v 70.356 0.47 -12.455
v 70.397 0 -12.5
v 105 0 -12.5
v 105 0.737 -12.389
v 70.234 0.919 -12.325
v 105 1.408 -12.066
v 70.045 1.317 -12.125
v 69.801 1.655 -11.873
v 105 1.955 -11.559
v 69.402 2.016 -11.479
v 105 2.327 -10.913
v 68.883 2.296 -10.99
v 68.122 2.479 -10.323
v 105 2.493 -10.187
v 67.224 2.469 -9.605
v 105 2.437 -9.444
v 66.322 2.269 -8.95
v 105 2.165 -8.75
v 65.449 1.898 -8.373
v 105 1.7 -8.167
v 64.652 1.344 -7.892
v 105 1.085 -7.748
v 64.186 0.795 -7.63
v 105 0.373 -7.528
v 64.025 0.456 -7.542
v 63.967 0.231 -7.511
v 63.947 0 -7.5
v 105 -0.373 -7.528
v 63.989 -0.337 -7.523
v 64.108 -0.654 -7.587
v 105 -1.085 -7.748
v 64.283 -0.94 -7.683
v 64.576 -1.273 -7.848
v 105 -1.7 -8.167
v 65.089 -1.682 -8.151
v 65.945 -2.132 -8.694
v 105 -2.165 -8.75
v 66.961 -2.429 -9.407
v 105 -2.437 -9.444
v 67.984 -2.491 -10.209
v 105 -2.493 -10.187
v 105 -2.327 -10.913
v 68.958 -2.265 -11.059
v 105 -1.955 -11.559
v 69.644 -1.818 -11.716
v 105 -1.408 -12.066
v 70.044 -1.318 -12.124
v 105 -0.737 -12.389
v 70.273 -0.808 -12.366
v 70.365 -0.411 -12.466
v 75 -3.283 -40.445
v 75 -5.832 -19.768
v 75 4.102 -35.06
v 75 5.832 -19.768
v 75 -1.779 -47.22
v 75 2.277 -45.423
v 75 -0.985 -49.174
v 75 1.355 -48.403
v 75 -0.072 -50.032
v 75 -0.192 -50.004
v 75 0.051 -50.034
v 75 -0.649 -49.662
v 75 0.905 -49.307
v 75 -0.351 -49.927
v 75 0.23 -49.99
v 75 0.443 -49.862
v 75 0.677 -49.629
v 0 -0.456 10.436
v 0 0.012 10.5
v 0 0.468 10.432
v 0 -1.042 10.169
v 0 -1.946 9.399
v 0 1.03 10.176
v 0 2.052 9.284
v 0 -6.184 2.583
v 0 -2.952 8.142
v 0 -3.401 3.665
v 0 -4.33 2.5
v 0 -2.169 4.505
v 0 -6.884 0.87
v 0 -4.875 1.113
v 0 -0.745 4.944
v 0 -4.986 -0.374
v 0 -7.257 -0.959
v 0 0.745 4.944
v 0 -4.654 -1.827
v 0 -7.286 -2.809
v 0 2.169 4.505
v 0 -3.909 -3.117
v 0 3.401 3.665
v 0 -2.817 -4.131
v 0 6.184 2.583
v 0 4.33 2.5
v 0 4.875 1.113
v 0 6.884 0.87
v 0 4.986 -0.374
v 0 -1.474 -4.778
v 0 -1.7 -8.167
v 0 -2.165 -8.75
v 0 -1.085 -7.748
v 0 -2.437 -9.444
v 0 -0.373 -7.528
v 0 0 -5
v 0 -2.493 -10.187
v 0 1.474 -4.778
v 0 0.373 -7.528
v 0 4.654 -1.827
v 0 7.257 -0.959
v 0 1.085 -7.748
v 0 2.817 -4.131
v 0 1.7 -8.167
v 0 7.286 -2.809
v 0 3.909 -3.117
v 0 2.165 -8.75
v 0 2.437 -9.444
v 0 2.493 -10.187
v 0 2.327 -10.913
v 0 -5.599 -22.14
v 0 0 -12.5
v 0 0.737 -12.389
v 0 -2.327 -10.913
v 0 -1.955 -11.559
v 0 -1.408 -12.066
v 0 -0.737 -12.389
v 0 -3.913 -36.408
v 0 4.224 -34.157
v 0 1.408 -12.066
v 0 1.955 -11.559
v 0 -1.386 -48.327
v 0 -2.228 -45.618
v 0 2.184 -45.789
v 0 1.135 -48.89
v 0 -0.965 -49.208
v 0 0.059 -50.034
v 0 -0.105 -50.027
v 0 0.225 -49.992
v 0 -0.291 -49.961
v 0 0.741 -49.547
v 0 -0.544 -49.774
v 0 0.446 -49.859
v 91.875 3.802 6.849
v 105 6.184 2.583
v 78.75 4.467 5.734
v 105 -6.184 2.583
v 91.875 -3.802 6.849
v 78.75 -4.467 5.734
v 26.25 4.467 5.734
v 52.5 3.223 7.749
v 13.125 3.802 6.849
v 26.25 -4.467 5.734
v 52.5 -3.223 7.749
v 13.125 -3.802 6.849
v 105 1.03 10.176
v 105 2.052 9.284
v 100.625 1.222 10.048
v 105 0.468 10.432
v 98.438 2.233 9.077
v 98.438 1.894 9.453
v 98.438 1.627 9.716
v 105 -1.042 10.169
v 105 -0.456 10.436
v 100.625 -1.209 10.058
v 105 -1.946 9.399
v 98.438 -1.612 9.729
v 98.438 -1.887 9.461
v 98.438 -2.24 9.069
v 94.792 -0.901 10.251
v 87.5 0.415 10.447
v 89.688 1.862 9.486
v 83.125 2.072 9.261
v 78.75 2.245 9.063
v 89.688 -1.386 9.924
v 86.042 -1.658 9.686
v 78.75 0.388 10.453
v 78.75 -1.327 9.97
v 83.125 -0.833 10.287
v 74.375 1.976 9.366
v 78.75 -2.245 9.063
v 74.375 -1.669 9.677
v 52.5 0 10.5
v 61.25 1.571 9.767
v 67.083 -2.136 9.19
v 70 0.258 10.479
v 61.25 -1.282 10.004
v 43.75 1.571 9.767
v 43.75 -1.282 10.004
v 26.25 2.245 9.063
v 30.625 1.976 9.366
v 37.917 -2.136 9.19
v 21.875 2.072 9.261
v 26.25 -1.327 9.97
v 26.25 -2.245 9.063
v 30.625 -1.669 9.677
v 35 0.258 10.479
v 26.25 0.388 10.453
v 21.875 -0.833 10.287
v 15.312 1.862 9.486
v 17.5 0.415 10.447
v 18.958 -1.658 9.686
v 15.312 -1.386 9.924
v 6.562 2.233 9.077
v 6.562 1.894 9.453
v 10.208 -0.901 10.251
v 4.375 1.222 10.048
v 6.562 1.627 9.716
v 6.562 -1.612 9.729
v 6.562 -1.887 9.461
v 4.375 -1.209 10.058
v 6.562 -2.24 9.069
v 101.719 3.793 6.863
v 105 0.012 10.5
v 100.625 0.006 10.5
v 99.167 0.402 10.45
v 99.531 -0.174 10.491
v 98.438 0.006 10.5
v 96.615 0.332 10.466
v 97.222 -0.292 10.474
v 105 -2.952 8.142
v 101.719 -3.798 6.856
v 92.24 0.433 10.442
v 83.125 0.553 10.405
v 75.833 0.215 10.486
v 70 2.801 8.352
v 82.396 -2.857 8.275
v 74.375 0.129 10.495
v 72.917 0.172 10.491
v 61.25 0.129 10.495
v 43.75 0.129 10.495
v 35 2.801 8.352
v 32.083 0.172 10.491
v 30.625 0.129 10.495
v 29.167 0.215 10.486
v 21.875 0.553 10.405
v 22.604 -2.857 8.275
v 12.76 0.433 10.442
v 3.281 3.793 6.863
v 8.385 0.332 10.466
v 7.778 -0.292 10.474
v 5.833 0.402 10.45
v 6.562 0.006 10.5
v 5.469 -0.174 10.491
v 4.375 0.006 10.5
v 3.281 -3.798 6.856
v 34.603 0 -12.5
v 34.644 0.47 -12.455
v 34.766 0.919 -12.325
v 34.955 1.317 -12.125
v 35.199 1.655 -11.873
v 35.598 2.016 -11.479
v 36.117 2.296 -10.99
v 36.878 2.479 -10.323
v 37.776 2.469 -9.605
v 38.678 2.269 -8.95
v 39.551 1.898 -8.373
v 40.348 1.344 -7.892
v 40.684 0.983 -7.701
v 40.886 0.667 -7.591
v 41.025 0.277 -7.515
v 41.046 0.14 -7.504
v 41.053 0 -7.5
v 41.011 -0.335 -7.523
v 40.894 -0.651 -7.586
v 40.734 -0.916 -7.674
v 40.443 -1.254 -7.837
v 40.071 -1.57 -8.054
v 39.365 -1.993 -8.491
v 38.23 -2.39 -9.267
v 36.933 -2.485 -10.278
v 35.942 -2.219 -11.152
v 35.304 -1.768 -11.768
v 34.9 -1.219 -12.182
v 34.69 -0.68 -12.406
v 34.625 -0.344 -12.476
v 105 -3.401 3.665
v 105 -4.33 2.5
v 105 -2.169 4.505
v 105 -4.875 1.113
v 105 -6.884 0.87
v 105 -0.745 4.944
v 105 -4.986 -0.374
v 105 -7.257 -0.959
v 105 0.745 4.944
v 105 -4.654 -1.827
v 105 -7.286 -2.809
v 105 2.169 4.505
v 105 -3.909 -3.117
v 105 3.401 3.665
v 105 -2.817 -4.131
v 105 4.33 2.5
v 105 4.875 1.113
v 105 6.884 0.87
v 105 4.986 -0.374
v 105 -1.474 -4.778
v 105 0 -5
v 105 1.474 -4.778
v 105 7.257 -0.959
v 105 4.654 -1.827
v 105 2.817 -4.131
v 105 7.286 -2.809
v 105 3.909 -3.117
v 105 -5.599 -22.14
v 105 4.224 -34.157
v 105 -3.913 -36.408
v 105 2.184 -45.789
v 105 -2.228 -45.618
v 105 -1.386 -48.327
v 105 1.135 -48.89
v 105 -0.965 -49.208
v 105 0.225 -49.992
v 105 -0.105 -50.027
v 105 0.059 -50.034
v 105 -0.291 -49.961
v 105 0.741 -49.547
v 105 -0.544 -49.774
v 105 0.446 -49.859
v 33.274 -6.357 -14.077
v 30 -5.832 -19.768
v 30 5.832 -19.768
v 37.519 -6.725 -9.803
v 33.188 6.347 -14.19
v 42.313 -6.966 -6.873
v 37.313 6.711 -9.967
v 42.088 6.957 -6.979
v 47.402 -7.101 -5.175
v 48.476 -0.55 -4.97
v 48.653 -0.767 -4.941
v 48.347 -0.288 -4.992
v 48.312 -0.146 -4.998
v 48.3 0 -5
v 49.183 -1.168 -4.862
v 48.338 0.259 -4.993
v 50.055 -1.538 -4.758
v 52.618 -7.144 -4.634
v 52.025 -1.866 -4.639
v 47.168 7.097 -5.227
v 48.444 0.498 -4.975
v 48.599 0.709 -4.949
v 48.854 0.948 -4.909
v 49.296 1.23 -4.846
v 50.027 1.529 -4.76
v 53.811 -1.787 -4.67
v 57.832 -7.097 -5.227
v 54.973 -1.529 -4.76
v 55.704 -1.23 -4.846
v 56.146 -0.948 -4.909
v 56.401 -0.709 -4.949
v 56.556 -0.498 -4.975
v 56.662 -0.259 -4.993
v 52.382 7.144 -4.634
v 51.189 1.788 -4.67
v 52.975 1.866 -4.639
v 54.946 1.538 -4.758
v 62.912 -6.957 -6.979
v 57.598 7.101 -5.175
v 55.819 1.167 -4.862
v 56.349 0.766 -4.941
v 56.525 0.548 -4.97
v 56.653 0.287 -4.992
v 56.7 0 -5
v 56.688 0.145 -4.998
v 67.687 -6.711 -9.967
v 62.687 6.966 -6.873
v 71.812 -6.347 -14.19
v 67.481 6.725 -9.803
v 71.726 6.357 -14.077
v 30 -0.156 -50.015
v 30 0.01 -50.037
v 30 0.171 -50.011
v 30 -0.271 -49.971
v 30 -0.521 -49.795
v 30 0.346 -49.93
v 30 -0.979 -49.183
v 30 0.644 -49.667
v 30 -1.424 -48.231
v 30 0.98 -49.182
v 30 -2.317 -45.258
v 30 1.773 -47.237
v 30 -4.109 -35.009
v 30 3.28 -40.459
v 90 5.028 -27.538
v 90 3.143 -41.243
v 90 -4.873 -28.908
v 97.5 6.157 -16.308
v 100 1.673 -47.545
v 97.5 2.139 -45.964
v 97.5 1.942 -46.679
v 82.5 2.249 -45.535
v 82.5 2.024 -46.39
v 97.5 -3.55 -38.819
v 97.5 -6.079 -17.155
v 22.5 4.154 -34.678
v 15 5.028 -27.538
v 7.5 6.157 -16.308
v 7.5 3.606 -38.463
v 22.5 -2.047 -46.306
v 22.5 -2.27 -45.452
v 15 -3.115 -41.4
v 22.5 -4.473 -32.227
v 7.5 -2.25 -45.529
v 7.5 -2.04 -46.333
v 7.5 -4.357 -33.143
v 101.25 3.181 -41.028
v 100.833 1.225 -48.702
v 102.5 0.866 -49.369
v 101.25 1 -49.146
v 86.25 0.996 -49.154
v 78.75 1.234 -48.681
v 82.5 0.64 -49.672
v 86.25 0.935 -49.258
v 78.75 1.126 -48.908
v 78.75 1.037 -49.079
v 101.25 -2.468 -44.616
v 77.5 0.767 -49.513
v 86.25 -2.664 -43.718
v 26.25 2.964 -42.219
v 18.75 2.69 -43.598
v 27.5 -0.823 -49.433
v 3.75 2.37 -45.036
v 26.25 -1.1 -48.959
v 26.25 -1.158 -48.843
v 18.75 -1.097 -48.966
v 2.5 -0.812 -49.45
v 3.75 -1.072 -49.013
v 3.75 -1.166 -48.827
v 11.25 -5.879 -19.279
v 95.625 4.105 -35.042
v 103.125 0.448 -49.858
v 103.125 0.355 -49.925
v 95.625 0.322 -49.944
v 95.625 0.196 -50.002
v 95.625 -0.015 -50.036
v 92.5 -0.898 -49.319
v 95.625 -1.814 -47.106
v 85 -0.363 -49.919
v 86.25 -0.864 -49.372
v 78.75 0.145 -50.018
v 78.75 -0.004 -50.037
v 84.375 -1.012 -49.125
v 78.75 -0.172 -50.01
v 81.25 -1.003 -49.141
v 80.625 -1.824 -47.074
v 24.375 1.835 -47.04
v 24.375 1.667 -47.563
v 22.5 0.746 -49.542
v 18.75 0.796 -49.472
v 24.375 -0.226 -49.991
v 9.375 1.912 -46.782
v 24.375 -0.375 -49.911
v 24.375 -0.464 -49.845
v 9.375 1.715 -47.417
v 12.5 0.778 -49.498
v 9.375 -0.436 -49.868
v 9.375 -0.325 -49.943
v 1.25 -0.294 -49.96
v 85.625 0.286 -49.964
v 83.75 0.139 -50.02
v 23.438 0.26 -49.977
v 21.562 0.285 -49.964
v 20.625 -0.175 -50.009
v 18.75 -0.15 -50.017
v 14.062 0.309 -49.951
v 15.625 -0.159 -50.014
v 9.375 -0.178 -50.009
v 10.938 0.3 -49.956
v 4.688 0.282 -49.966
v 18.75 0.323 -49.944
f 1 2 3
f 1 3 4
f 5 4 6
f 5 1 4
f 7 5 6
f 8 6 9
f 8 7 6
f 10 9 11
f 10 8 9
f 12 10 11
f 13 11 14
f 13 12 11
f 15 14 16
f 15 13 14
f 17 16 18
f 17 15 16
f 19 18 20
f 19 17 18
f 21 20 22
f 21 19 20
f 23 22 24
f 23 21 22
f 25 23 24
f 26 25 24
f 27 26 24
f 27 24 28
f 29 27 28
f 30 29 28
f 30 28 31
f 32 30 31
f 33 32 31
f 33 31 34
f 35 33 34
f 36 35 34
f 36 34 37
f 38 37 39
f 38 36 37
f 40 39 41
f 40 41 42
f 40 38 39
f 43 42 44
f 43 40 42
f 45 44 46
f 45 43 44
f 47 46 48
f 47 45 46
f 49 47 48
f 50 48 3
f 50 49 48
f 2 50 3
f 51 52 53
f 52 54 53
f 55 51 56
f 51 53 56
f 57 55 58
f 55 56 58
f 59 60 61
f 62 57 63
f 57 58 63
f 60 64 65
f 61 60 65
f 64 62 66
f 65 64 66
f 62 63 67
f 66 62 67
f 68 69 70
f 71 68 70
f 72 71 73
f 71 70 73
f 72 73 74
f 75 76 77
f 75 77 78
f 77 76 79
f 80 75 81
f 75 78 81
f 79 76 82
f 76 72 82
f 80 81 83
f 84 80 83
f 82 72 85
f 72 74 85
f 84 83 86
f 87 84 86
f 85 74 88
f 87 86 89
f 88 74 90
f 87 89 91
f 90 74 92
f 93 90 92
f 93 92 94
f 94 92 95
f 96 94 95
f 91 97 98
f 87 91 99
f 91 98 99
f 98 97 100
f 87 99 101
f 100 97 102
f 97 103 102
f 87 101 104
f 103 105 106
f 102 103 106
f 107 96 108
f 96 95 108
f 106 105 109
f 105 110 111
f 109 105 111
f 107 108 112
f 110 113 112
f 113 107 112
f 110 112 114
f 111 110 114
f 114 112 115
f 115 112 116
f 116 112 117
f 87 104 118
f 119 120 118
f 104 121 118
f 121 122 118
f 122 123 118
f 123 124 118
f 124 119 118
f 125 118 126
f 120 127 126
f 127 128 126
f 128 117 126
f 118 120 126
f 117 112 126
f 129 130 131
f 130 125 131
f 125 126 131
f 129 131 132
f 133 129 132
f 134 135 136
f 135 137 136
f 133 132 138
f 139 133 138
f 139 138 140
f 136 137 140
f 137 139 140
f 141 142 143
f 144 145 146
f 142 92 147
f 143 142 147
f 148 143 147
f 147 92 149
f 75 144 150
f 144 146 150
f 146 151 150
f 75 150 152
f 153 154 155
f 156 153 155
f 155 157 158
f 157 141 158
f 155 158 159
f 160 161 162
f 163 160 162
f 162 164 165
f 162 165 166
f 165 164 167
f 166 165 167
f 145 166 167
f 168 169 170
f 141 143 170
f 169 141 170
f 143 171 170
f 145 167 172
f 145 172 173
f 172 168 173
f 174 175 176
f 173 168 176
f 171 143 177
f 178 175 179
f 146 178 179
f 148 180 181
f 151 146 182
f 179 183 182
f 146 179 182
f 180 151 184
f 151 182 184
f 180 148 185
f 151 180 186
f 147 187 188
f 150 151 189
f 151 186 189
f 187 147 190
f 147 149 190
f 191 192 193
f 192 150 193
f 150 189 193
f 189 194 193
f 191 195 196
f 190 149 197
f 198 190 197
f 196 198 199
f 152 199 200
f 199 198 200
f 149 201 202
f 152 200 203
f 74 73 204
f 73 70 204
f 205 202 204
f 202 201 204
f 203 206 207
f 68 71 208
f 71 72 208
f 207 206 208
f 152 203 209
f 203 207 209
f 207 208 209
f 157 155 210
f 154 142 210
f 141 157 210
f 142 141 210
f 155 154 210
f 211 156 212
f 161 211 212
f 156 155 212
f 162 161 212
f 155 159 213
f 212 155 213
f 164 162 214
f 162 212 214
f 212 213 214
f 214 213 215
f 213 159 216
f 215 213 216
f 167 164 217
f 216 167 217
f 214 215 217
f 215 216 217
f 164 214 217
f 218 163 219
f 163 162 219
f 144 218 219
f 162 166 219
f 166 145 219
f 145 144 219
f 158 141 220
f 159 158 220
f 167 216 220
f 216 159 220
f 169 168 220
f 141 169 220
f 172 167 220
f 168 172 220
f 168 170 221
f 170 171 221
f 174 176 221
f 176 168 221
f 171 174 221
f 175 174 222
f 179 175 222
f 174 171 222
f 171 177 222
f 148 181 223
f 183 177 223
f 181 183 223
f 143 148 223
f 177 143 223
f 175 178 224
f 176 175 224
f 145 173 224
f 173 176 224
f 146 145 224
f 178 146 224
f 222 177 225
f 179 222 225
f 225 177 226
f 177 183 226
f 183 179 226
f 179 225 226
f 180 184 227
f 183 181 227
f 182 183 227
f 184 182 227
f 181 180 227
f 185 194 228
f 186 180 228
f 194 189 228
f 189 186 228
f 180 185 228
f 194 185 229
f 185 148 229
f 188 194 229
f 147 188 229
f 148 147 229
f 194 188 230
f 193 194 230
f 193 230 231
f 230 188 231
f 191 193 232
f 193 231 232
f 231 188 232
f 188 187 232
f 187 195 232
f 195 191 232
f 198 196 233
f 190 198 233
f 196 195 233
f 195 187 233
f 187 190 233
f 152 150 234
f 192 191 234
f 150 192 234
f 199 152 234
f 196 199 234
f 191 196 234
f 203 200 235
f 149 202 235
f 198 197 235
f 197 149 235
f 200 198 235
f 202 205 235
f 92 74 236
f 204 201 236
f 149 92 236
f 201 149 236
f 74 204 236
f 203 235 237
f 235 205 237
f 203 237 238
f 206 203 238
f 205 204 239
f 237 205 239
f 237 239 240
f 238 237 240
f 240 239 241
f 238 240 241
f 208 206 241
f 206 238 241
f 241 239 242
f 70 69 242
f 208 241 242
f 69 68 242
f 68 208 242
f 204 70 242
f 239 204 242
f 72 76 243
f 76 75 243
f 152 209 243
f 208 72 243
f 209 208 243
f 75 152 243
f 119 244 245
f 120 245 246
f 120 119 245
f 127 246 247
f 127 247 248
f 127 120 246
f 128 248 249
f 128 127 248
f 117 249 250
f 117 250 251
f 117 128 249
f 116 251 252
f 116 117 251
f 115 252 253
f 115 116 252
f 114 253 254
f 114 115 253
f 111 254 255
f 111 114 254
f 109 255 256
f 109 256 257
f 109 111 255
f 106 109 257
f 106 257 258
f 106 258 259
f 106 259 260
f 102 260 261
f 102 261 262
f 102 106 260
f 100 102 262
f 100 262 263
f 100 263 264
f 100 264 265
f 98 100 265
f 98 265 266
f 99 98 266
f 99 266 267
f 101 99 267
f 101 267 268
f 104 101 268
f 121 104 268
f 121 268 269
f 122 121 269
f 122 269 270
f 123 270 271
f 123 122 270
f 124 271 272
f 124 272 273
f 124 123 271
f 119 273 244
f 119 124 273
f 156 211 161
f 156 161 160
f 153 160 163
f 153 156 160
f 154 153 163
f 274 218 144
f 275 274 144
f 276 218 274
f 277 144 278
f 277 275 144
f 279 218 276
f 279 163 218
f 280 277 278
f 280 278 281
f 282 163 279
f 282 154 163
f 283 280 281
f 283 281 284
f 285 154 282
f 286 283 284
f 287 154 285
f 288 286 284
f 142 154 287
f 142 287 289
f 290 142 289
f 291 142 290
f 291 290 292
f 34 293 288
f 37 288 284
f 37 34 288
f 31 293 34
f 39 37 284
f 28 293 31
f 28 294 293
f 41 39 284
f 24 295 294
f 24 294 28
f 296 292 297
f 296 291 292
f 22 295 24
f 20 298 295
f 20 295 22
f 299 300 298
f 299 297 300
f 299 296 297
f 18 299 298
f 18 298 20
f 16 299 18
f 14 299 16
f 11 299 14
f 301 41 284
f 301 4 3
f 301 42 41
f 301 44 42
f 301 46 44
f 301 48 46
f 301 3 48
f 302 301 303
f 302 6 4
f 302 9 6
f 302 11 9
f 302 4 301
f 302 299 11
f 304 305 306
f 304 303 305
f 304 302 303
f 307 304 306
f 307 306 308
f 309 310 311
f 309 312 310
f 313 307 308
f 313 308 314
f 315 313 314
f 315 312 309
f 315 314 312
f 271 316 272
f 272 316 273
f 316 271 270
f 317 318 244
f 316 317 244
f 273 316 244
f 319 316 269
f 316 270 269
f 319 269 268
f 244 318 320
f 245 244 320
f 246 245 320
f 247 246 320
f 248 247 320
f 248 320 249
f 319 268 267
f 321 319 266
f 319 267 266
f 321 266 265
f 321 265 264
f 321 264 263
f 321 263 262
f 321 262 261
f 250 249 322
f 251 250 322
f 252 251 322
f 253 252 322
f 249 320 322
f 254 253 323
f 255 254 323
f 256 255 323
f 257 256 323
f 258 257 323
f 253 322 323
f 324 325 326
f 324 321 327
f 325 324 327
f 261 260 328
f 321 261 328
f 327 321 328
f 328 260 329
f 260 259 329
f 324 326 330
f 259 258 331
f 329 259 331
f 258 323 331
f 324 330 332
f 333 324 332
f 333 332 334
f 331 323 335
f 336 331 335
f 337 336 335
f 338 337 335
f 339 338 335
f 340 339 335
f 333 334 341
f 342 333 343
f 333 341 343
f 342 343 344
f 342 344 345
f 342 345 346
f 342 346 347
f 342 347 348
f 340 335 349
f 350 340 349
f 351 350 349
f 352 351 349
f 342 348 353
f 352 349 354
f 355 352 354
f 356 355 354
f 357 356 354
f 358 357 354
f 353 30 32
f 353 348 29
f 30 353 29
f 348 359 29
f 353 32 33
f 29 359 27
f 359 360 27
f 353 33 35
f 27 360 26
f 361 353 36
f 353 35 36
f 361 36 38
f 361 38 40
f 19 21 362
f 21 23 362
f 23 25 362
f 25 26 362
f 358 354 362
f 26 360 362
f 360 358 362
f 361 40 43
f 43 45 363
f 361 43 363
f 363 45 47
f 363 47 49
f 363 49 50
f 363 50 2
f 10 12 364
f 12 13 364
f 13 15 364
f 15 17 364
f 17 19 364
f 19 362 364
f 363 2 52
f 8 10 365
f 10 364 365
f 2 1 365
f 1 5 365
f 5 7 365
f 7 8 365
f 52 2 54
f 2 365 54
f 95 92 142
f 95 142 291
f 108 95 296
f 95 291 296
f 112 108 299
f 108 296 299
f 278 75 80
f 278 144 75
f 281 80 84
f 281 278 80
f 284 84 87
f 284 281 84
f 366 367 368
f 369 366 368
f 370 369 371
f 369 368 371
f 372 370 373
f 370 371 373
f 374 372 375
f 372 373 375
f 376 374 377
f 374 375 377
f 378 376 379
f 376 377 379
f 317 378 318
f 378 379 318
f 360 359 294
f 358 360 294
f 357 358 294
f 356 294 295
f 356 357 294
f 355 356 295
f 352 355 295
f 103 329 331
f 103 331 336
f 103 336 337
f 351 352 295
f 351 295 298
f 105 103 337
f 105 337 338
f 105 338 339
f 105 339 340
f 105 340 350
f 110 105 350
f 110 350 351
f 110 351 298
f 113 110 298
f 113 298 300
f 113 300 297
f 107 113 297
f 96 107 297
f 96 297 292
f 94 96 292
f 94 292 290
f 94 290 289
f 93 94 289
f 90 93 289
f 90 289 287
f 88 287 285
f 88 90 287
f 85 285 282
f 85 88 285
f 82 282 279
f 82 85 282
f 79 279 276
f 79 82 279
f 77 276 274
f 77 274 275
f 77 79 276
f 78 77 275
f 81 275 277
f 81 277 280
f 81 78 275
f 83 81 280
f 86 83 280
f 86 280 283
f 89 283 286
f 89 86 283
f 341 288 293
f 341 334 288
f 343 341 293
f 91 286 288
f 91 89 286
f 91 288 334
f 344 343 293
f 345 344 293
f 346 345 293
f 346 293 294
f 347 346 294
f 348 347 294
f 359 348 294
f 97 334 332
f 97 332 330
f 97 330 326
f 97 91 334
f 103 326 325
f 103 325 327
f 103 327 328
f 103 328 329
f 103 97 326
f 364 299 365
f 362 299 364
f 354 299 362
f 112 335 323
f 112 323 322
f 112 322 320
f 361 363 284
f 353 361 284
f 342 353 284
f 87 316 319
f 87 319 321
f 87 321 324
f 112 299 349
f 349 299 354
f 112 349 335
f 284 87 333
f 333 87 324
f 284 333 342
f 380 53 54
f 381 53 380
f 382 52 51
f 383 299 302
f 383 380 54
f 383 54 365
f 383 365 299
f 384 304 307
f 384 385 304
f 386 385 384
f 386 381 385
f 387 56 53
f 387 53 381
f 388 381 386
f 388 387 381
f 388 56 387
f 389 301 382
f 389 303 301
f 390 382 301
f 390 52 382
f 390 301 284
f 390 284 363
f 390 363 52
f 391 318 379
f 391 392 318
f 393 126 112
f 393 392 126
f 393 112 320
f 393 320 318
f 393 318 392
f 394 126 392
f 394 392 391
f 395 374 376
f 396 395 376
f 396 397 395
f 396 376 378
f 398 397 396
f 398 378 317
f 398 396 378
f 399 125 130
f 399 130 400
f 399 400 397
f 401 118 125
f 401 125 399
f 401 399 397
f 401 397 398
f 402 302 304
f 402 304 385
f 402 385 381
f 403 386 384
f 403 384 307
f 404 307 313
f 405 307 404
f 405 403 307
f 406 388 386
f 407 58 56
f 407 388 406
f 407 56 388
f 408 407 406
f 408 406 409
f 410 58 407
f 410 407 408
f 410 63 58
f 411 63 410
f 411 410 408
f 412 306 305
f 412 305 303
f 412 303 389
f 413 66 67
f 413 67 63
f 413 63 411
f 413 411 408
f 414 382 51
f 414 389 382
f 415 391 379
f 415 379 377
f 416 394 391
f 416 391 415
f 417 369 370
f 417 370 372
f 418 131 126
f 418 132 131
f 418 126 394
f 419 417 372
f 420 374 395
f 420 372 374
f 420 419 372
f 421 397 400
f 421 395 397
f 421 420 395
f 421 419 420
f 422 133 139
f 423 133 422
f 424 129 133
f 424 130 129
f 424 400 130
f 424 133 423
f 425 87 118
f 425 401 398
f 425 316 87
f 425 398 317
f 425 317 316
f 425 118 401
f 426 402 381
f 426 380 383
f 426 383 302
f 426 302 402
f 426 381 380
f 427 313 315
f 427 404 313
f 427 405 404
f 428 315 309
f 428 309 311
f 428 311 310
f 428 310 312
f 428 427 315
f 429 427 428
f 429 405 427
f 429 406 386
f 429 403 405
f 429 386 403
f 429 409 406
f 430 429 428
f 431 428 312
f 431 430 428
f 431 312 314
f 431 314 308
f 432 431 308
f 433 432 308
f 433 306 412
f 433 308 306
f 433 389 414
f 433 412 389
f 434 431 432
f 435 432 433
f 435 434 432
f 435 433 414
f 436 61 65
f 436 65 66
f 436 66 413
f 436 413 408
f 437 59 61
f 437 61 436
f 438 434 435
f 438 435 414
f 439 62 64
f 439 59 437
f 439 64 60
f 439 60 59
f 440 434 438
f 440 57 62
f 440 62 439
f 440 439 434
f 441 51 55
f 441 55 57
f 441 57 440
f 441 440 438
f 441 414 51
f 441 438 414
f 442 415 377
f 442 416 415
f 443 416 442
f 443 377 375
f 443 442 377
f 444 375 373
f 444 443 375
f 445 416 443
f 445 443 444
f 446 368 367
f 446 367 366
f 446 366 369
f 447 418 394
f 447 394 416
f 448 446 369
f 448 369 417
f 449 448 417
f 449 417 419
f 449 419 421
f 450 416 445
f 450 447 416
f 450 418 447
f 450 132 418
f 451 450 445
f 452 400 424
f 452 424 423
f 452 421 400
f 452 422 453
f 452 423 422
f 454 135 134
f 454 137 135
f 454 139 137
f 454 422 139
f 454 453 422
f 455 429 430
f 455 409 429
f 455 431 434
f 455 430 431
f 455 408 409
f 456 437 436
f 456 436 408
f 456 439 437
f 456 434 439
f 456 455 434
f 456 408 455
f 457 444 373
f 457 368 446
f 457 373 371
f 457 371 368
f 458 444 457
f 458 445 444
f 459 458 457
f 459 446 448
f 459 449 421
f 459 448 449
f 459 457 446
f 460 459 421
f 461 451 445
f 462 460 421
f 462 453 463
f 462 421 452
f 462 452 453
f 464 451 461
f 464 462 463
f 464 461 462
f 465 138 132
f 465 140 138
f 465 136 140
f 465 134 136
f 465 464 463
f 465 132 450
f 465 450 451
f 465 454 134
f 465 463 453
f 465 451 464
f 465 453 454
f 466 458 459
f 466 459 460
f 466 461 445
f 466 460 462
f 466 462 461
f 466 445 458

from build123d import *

# Parameters (mm, degrees)
SKETCH1_R               = 5
SKETCH1_R_2             = 2.5
BOSS_EXTRUDE1_DEPTH     = 105
FILLET1_R               = 10
CUT_EXTRUDE1_DEPTH      = 117.542660484
CUT_EXTRUDE1_DEPTH_BACK = 117.542660484


with BuildPart() as part:
    # Sketch1 → Boss-Extrude1 (new body)
    with BuildSketch(Plane(origin=(0, 0, 0), x_dir=(0, 0, -1), z_dir=(1, 0, 0))):
        with BuildLine():
            add(Edge.make_bspline(
                [(3.73e-07, 7.5), (-15, 0), (-3.73e-07, -7.5)],
                knots=[0, 0, 0, 1, 1, 1], degree=2, weights=[1, 2.333333333, 1]))
            add(Edge.make_bspline(
                [(3.73e-07, 7.5), (100, 0), (-3.73e-07, -7.5)],
                knots=[0, 0, 0, 1, 1, 1], degree=2, weights=[1, 1.001467765, 1]))
        make_face()
        Circle(SKETCH1_R, mode=Mode.SUBTRACT)
        with Locations((10, 0)):
            Circle(SKETCH1_R_2, mode=Mode.SUBTRACT)
    extrude(amount=BOSS_EXTRUDE1_DEPTH)

    # Fillet1
    fillet1_edges = [part.edges().sort_by_distance(p)[0] for p in [
        (52.5, 7.5, -3.73e-07),
        (52.5, -7.5, 3.73e-07),
    ]]
    fillet(fillet1_edges, radius=FILLET1_R)

    # Sketch2 → Cut-Extrude1 (cut, two sides)
    with BuildSketch(Plane(origin=(0, 0, 0), x_dir=(1, 0, 0), z_dir=(0, 1, 0))) as cut_extrude1_sk:
        with BuildLine():
            Line((75, 50.03666722), (30, 50.03666722))
            Line((30, 50.03666722), (30, 19.76833361))
            ThreePointArc((30, 19.76833361), (52.5, 4.634166805), (75, 19.76833361))
            Line((75, 19.76833361), (75, 50.03666722))
        make_face()
    extrude(amount=CUT_EXTRUDE1_DEPTH, mode=Mode.SUBTRACT)
    extrude(cut_extrude1_sk.sketch, amount=-CUT_EXTRUDE1_DEPTH_BACK, mode=Mode.SUBTRACT)


solid = part.part
